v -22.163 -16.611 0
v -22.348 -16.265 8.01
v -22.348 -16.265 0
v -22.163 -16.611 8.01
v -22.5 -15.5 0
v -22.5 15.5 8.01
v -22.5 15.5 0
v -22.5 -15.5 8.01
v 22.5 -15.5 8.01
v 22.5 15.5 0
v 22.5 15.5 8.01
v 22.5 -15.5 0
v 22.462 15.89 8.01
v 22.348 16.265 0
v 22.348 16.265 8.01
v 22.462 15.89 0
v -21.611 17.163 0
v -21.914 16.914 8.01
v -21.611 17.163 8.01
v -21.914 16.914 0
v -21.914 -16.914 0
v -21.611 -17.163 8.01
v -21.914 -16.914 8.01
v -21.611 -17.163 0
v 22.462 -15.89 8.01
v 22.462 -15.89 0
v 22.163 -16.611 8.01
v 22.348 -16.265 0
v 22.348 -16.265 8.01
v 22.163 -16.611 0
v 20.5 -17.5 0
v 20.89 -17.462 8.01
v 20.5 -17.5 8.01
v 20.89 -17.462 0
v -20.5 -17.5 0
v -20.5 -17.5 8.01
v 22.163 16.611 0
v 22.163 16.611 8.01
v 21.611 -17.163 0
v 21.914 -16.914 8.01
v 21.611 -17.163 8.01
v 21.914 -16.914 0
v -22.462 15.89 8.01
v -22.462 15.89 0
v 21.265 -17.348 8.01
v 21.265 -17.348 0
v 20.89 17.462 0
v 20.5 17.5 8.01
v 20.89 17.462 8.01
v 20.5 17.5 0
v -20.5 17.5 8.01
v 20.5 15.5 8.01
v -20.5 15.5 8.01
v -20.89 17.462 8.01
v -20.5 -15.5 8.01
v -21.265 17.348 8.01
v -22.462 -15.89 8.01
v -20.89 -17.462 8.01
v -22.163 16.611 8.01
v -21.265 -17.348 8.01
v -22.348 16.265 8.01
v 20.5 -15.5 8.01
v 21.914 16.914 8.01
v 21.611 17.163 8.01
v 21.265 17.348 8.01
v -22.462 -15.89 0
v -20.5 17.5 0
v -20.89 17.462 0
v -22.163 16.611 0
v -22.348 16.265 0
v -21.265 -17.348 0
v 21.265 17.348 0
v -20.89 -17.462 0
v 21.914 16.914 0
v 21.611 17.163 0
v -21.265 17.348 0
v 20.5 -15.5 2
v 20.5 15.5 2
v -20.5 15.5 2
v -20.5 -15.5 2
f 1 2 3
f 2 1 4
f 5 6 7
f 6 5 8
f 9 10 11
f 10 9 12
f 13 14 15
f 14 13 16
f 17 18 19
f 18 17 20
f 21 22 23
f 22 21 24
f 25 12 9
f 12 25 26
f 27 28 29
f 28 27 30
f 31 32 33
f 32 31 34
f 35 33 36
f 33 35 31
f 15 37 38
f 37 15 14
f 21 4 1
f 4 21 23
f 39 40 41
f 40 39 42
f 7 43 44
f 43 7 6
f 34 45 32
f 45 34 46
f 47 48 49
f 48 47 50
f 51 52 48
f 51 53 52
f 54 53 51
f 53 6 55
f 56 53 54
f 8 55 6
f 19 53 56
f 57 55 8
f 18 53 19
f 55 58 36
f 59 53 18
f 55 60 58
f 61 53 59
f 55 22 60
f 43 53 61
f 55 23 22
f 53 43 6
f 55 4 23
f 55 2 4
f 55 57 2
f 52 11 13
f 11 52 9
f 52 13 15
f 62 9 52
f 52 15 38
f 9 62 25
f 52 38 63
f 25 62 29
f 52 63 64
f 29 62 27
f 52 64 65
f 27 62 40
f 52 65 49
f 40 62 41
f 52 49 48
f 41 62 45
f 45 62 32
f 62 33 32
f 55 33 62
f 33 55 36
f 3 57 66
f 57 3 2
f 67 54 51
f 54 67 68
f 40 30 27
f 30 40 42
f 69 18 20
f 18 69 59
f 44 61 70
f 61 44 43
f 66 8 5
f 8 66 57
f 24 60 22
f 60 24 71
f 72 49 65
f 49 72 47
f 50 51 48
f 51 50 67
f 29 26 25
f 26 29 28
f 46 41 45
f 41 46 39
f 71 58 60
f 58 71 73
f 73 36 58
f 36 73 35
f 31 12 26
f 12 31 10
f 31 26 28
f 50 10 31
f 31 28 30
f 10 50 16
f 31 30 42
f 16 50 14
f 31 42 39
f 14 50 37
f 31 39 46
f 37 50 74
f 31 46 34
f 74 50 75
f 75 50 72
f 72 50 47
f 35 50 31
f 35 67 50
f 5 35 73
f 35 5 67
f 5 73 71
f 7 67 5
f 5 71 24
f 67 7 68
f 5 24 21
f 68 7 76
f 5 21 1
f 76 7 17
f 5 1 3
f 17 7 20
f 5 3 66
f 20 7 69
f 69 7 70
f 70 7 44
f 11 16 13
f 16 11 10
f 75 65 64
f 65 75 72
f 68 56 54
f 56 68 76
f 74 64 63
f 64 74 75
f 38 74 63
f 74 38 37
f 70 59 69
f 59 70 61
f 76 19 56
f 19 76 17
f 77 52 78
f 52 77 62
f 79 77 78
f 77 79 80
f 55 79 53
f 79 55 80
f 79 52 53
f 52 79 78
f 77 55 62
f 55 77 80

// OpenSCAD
board_w=38; board_h=28; wall=2; clearance=1.5; base_d=8; lid_d=12;
outer_w=board_w+2*clearance+2*wall; outer_h=board_h+2*clearance+2*wall;
module rounded_box(w,h,d,r=2){minkowski(){cube([w-2*r,h-2*r,d],center=true);cylinder(r=r,h=.01,$fn=32);}}
module base(){difference(){translate([0,0,base_d/2])rounded_box(outer_w,outer_h,base_d,2);translate([0,0,base_d/2+wall])cube([outer_w-2*wall,outer_h-2*wall,base_d],center=true);}}
module lid(){difference(){translate([0,0,lid_d/2])rounded_box(outer_w,outer_h,lid_d,2);translate([0,0,lid_d/2-wall])cube([outer_w-2*wall,outer_h-2*wall,lid_d],center=true);for(y=[-outer_h/2+6:5:outer_h/2-6])translate([0,y,lid_d-wall/2])cube([outer_w-10,2.5,wall+2],center=true);}}
base();
